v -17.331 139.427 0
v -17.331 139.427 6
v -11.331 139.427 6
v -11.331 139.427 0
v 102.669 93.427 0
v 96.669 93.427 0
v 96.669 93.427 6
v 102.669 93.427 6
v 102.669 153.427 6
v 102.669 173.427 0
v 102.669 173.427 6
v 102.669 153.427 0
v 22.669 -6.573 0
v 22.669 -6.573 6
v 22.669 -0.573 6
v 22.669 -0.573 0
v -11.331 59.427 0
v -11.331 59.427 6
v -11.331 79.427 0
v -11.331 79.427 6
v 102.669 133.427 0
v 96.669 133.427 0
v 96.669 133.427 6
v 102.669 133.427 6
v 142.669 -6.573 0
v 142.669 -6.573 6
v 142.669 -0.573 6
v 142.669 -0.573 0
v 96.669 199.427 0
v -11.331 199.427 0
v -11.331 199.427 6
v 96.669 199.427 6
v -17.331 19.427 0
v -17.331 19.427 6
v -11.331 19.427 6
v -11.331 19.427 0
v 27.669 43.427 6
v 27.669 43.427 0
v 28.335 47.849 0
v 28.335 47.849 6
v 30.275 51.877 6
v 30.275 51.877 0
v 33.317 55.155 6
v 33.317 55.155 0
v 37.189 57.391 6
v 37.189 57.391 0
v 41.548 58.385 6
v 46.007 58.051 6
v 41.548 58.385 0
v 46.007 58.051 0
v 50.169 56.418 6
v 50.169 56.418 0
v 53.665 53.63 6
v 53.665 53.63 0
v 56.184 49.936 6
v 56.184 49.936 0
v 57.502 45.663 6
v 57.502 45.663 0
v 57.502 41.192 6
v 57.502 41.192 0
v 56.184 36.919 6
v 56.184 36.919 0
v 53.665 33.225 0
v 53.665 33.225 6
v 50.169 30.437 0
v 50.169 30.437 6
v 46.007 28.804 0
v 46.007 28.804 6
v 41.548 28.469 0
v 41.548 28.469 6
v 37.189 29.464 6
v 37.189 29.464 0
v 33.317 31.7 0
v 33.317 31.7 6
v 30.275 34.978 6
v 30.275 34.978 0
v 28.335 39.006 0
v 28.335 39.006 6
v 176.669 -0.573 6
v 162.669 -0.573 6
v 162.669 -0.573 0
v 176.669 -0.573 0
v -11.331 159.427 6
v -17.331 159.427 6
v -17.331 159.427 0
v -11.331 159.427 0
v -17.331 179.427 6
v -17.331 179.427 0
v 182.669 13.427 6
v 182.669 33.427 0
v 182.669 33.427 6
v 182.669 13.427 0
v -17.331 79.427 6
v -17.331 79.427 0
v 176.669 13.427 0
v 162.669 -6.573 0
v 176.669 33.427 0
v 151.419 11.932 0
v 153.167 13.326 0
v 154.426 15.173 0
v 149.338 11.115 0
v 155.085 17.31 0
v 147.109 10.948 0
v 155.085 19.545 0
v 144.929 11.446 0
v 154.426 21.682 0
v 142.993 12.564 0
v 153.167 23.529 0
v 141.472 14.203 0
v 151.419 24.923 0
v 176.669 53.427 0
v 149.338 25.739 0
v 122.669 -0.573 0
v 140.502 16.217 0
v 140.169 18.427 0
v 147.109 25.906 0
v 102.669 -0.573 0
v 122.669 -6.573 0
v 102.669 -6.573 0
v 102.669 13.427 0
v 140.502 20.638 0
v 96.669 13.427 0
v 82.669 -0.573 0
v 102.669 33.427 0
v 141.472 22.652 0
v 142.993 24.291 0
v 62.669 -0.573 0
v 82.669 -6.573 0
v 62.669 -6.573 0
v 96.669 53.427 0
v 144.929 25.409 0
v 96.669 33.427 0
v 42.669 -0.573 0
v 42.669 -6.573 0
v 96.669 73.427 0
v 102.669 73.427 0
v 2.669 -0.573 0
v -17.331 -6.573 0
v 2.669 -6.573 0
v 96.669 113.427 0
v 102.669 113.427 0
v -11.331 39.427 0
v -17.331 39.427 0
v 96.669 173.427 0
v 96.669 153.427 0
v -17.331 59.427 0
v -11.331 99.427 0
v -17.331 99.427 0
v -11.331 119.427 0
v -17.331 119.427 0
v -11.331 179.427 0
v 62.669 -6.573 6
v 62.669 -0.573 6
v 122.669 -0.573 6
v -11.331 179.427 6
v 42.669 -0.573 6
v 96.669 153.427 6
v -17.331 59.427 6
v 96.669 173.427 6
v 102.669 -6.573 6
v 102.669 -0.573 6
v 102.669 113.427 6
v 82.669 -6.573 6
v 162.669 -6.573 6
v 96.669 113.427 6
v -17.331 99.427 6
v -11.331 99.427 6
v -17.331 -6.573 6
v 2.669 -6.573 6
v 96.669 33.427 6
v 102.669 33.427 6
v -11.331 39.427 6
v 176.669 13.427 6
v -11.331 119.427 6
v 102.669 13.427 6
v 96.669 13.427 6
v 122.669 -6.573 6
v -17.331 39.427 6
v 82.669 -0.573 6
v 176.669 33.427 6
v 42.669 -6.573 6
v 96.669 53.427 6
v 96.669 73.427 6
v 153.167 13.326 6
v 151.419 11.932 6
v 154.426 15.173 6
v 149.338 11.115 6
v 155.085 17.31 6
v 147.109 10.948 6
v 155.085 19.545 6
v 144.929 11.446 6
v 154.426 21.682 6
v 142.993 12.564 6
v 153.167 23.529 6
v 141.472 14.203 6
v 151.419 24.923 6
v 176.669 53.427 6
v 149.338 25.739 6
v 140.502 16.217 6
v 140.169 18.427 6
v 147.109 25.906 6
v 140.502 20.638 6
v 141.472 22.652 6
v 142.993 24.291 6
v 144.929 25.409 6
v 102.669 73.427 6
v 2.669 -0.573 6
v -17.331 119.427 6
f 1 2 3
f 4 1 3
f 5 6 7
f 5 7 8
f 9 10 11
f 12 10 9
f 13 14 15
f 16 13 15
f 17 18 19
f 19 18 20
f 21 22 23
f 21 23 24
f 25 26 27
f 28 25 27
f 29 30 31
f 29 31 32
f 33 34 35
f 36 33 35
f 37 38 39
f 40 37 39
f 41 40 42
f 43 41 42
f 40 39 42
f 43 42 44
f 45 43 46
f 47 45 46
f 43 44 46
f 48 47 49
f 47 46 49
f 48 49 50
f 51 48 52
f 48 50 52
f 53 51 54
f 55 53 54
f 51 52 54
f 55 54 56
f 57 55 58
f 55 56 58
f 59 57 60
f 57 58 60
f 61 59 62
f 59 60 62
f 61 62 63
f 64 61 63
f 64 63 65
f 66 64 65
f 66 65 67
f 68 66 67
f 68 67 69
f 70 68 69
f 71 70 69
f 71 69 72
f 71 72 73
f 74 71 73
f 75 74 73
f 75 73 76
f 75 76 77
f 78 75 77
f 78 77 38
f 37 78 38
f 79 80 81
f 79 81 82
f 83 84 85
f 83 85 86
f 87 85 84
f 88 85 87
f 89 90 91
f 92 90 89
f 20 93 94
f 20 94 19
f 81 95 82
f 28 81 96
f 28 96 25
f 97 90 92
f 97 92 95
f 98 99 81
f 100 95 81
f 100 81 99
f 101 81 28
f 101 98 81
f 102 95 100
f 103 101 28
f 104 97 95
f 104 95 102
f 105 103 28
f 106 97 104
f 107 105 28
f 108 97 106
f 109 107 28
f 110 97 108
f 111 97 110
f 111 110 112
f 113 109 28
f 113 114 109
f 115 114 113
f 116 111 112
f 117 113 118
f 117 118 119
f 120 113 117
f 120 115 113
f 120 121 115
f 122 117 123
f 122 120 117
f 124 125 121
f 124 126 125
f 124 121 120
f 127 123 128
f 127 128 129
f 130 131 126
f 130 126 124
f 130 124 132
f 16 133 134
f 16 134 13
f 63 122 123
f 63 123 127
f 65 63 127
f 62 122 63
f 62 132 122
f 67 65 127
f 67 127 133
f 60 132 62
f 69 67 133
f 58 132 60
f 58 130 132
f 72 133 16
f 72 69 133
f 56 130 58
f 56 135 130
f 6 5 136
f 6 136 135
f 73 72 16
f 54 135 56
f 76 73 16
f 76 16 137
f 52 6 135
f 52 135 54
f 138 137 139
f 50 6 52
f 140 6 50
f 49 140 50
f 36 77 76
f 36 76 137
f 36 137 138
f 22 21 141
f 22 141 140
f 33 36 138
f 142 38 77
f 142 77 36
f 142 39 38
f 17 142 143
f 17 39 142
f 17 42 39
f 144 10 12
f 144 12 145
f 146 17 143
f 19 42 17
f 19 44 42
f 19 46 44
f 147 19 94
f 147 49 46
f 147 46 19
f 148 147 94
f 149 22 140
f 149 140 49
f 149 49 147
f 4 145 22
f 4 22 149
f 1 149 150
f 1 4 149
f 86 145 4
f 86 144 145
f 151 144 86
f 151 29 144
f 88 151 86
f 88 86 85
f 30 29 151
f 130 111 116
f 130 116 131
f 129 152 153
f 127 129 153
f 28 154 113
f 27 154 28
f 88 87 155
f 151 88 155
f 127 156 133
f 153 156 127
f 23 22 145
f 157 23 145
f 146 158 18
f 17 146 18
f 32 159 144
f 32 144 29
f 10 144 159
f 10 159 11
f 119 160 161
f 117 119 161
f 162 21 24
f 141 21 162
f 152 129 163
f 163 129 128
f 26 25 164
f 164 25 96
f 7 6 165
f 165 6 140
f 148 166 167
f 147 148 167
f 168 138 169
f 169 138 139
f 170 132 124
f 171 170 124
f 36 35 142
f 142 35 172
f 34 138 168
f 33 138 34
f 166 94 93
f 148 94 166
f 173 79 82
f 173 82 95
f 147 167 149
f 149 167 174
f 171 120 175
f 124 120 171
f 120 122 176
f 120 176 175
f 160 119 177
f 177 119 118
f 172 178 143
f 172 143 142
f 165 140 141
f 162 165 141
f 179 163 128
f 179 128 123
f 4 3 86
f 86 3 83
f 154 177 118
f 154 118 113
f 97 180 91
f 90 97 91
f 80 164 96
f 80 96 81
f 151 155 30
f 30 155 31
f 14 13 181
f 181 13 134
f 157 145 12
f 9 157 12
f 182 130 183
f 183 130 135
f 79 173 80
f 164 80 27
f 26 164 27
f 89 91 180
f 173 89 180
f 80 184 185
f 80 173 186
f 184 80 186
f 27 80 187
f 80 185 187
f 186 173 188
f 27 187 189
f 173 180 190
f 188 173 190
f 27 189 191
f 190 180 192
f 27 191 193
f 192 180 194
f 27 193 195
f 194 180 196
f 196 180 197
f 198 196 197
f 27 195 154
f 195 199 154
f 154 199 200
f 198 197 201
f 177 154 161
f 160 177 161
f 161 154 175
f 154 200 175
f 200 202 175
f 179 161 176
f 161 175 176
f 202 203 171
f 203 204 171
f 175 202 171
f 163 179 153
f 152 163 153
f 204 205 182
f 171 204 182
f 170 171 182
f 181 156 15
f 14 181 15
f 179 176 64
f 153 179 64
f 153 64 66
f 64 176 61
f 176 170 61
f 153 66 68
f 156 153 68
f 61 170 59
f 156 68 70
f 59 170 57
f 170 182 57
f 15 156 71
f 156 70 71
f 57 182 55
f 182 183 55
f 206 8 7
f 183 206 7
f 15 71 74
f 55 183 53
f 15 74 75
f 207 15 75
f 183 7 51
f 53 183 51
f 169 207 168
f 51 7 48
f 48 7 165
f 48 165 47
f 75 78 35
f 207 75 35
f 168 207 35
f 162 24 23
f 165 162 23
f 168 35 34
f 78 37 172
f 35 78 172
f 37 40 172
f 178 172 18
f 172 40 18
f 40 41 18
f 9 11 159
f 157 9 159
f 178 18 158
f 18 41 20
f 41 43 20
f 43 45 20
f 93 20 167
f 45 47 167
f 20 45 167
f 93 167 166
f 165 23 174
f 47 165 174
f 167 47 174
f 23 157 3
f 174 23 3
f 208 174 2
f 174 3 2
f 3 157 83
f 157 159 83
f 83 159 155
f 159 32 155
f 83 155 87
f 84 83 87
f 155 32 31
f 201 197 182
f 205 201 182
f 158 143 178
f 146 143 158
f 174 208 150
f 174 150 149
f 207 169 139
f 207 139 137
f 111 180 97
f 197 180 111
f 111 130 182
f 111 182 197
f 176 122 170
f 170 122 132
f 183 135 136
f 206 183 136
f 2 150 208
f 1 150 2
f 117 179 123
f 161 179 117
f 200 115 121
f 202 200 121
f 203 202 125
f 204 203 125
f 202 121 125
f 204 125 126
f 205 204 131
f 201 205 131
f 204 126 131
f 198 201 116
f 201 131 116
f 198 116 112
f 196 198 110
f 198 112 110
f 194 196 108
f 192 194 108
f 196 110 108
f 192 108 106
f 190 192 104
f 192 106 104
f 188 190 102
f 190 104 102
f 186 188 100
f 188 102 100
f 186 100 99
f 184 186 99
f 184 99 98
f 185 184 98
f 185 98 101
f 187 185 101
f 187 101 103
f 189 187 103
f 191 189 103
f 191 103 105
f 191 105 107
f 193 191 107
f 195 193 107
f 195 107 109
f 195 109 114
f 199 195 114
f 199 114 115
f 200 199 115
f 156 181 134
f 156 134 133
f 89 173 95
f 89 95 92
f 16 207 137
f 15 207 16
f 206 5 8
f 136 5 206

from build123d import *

# Parameters (mm, degrees)
BOSS_EXTRUDE1_DEPTH = 6
SKETCH2_W           = 20
SKETCH2_H           = 6
CUT_EXTRUDE1_DEPTH  = 7
LPATTERN1_COUNT     = 5
LPATTERN1_PITCH     = 40
SKETCH3_W           = 6
SKETCH3_H           = 20
CUT_EXTRUDE2_DEPTH  = 7
LPATTERN2_COUNT     = 5
LPATTERN2_PITCH     = 40
SKETCH4_W           = 6
SKETCH4_H           = 6
CUT_EXTRUDE3_DEPTH  = 10
SKETCH5_W           = 6
SKETCH5_H           = 20
CUT_EXTRUDE4_DEPTH  = 10
LPATTERN3_COUNT     = 2
LPATTERN3_PITCH     = 40
SKETCH7_W           = 6
SKETCH7_H           = 20
CUT_EXTRUDE5_DEPTH  = 10
LPATTERN4_COUNT     = 5
LPATTERN4_PITCH     = 40
SKETCH8_R           = 15
CUT_EXTRUDE6_DEPTH  = 10
SKETCH9_R           = 7.5
CUT_EXTRUDE7_DEPTH  = 7


with BuildPart() as part:
    # Sketch1 → Boss-Extrude1 (new body)
    with BuildSketch(Plane.XY):
        Polygon((-17.330934256, 199.427419355), (102.669065744, 199.427419355), (102.669065744, 53.427419355), (182.669065744, 53.427419355), (182.669065744, -6.572580645), (102.669065744, -6.572580645), (-17.330934256, -6.572580645), align=None)
    extrude(amount=BOSS_EXTRUDE1_DEPTH)

    # Sketch2 → Cut-Extrude1 (cut, through all)
    with BuildSketch(Plane.XY.offset(6)):
        with Locations((12.669065744, -3.572580645)):
            Rectangle(SKETCH2_W, SKETCH2_H)
    cut_extrude1 = extrude(amount=-CUT_EXTRUDE1_DEPTH, mode=Mode.SUBTRACT)

    # LPattern1: Cut-Extrude1 ×5
    with Locations(*[(i * LPATTERN1_PITCH, 0, 0) for i in range(1, LPATTERN1_COUNT)]):
        add(cut_extrude1, mode=Mode.SUBTRACT)

    # Sketch3 → Cut-Extrude2 (cut, through all)
    with BuildSketch(Plane.XY):
        with Locations((99.669065744, 23.427419355)):
            Rectangle(SKETCH3_W, SKETCH3_H)
    cut_extrude2 = extrude(amount=CUT_EXTRUDE2_DEPTH, mode=Mode.SUBTRACT)

    # LPattern2: Cut-Extrude2 ×5
    with Locations(*[(0, i * LPATTERN2_PITCH, 0) for i in range(1, LPATTERN2_COUNT)]):
        add(cut_extrude2, mode=Mode.SUBTRACT)

    # Sketch4 → Cut-Extrude3 (cut)
    with BuildSketch(Plane.XY.offset(6)):
        with Locations((99.669065744, 196.427419355)):
            Rectangle(SKETCH4_W, SKETCH4_H)
    extrude(amount=-CUT_EXTRUDE3_DEPTH, mode=Mode.SUBTRACT)

    # Sketch5 → Cut-Extrude4 (cut)
    with BuildSketch(Plane.XY.offset(6)):
        with Locations((179.669065744, 43.427419355)):
            Rectangle(SKETCH5_W, SKETCH5_H)
    cut_extrude4 = extrude(amount=-CUT_EXTRUDE4_DEPTH, mode=Mode.SUBTRACT)

    # LPattern3: Cut-Extrude4 ×2
    with Locations(*[(0, -i * LPATTERN3_PITCH, 0) for i in range(1, LPATTERN3_COUNT)]):
        add(cut_extrude4, mode=Mode.SUBTRACT)

    # Sketch7 → Cut-Extrude5 (cut)
    with BuildSketch(Plane.XY.offset(6)):
        with Locations((-14.330934256, 189.427419355)):
            Rectangle(SKETCH7_W, SKETCH7_H)
    cut_extrude5 = extrude(amount=-CUT_EXTRUDE5_DEPTH, mode=Mode.SUBTRACT)

    # LPattern4: Cut-Extrude5 ×5
    with Locations(*[(0, -i * LPATTERN4_PITCH, 0) for i in range(1, LPATTERN4_COUNT)]):
        add(cut_extrude5, mode=Mode.SUBTRACT)

    # Sketch8 → Cut-Extrude6 (cut)
    with BuildSketch(Plane(origin=(0, 0, 0), x_dir=(-1, 0, 0), z_dir=(0, 0, -1))):
        with Locations((-42.669065744, 43.427419355)):
            Circle(SKETCH8_R)
    extrude(amount=-CUT_EXTRUDE6_DEPTH, mode=Mode.SUBTRACT)

    # Sketch9 → Cut-Extrude7 (cut, through all)
    with BuildSketch(Plane(origin=(0, 0, 0), x_dir=(-1, 0, 0), z_dir=(0, 0, -1))):
        with Locations((-147.669065744, 18.427419355)):
            Circle(SKETCH9_R)
    extrude(amount=-CUT_EXTRUDE7_DEPTH, mode=Mode.SUBTRACT)


solid = part.part
